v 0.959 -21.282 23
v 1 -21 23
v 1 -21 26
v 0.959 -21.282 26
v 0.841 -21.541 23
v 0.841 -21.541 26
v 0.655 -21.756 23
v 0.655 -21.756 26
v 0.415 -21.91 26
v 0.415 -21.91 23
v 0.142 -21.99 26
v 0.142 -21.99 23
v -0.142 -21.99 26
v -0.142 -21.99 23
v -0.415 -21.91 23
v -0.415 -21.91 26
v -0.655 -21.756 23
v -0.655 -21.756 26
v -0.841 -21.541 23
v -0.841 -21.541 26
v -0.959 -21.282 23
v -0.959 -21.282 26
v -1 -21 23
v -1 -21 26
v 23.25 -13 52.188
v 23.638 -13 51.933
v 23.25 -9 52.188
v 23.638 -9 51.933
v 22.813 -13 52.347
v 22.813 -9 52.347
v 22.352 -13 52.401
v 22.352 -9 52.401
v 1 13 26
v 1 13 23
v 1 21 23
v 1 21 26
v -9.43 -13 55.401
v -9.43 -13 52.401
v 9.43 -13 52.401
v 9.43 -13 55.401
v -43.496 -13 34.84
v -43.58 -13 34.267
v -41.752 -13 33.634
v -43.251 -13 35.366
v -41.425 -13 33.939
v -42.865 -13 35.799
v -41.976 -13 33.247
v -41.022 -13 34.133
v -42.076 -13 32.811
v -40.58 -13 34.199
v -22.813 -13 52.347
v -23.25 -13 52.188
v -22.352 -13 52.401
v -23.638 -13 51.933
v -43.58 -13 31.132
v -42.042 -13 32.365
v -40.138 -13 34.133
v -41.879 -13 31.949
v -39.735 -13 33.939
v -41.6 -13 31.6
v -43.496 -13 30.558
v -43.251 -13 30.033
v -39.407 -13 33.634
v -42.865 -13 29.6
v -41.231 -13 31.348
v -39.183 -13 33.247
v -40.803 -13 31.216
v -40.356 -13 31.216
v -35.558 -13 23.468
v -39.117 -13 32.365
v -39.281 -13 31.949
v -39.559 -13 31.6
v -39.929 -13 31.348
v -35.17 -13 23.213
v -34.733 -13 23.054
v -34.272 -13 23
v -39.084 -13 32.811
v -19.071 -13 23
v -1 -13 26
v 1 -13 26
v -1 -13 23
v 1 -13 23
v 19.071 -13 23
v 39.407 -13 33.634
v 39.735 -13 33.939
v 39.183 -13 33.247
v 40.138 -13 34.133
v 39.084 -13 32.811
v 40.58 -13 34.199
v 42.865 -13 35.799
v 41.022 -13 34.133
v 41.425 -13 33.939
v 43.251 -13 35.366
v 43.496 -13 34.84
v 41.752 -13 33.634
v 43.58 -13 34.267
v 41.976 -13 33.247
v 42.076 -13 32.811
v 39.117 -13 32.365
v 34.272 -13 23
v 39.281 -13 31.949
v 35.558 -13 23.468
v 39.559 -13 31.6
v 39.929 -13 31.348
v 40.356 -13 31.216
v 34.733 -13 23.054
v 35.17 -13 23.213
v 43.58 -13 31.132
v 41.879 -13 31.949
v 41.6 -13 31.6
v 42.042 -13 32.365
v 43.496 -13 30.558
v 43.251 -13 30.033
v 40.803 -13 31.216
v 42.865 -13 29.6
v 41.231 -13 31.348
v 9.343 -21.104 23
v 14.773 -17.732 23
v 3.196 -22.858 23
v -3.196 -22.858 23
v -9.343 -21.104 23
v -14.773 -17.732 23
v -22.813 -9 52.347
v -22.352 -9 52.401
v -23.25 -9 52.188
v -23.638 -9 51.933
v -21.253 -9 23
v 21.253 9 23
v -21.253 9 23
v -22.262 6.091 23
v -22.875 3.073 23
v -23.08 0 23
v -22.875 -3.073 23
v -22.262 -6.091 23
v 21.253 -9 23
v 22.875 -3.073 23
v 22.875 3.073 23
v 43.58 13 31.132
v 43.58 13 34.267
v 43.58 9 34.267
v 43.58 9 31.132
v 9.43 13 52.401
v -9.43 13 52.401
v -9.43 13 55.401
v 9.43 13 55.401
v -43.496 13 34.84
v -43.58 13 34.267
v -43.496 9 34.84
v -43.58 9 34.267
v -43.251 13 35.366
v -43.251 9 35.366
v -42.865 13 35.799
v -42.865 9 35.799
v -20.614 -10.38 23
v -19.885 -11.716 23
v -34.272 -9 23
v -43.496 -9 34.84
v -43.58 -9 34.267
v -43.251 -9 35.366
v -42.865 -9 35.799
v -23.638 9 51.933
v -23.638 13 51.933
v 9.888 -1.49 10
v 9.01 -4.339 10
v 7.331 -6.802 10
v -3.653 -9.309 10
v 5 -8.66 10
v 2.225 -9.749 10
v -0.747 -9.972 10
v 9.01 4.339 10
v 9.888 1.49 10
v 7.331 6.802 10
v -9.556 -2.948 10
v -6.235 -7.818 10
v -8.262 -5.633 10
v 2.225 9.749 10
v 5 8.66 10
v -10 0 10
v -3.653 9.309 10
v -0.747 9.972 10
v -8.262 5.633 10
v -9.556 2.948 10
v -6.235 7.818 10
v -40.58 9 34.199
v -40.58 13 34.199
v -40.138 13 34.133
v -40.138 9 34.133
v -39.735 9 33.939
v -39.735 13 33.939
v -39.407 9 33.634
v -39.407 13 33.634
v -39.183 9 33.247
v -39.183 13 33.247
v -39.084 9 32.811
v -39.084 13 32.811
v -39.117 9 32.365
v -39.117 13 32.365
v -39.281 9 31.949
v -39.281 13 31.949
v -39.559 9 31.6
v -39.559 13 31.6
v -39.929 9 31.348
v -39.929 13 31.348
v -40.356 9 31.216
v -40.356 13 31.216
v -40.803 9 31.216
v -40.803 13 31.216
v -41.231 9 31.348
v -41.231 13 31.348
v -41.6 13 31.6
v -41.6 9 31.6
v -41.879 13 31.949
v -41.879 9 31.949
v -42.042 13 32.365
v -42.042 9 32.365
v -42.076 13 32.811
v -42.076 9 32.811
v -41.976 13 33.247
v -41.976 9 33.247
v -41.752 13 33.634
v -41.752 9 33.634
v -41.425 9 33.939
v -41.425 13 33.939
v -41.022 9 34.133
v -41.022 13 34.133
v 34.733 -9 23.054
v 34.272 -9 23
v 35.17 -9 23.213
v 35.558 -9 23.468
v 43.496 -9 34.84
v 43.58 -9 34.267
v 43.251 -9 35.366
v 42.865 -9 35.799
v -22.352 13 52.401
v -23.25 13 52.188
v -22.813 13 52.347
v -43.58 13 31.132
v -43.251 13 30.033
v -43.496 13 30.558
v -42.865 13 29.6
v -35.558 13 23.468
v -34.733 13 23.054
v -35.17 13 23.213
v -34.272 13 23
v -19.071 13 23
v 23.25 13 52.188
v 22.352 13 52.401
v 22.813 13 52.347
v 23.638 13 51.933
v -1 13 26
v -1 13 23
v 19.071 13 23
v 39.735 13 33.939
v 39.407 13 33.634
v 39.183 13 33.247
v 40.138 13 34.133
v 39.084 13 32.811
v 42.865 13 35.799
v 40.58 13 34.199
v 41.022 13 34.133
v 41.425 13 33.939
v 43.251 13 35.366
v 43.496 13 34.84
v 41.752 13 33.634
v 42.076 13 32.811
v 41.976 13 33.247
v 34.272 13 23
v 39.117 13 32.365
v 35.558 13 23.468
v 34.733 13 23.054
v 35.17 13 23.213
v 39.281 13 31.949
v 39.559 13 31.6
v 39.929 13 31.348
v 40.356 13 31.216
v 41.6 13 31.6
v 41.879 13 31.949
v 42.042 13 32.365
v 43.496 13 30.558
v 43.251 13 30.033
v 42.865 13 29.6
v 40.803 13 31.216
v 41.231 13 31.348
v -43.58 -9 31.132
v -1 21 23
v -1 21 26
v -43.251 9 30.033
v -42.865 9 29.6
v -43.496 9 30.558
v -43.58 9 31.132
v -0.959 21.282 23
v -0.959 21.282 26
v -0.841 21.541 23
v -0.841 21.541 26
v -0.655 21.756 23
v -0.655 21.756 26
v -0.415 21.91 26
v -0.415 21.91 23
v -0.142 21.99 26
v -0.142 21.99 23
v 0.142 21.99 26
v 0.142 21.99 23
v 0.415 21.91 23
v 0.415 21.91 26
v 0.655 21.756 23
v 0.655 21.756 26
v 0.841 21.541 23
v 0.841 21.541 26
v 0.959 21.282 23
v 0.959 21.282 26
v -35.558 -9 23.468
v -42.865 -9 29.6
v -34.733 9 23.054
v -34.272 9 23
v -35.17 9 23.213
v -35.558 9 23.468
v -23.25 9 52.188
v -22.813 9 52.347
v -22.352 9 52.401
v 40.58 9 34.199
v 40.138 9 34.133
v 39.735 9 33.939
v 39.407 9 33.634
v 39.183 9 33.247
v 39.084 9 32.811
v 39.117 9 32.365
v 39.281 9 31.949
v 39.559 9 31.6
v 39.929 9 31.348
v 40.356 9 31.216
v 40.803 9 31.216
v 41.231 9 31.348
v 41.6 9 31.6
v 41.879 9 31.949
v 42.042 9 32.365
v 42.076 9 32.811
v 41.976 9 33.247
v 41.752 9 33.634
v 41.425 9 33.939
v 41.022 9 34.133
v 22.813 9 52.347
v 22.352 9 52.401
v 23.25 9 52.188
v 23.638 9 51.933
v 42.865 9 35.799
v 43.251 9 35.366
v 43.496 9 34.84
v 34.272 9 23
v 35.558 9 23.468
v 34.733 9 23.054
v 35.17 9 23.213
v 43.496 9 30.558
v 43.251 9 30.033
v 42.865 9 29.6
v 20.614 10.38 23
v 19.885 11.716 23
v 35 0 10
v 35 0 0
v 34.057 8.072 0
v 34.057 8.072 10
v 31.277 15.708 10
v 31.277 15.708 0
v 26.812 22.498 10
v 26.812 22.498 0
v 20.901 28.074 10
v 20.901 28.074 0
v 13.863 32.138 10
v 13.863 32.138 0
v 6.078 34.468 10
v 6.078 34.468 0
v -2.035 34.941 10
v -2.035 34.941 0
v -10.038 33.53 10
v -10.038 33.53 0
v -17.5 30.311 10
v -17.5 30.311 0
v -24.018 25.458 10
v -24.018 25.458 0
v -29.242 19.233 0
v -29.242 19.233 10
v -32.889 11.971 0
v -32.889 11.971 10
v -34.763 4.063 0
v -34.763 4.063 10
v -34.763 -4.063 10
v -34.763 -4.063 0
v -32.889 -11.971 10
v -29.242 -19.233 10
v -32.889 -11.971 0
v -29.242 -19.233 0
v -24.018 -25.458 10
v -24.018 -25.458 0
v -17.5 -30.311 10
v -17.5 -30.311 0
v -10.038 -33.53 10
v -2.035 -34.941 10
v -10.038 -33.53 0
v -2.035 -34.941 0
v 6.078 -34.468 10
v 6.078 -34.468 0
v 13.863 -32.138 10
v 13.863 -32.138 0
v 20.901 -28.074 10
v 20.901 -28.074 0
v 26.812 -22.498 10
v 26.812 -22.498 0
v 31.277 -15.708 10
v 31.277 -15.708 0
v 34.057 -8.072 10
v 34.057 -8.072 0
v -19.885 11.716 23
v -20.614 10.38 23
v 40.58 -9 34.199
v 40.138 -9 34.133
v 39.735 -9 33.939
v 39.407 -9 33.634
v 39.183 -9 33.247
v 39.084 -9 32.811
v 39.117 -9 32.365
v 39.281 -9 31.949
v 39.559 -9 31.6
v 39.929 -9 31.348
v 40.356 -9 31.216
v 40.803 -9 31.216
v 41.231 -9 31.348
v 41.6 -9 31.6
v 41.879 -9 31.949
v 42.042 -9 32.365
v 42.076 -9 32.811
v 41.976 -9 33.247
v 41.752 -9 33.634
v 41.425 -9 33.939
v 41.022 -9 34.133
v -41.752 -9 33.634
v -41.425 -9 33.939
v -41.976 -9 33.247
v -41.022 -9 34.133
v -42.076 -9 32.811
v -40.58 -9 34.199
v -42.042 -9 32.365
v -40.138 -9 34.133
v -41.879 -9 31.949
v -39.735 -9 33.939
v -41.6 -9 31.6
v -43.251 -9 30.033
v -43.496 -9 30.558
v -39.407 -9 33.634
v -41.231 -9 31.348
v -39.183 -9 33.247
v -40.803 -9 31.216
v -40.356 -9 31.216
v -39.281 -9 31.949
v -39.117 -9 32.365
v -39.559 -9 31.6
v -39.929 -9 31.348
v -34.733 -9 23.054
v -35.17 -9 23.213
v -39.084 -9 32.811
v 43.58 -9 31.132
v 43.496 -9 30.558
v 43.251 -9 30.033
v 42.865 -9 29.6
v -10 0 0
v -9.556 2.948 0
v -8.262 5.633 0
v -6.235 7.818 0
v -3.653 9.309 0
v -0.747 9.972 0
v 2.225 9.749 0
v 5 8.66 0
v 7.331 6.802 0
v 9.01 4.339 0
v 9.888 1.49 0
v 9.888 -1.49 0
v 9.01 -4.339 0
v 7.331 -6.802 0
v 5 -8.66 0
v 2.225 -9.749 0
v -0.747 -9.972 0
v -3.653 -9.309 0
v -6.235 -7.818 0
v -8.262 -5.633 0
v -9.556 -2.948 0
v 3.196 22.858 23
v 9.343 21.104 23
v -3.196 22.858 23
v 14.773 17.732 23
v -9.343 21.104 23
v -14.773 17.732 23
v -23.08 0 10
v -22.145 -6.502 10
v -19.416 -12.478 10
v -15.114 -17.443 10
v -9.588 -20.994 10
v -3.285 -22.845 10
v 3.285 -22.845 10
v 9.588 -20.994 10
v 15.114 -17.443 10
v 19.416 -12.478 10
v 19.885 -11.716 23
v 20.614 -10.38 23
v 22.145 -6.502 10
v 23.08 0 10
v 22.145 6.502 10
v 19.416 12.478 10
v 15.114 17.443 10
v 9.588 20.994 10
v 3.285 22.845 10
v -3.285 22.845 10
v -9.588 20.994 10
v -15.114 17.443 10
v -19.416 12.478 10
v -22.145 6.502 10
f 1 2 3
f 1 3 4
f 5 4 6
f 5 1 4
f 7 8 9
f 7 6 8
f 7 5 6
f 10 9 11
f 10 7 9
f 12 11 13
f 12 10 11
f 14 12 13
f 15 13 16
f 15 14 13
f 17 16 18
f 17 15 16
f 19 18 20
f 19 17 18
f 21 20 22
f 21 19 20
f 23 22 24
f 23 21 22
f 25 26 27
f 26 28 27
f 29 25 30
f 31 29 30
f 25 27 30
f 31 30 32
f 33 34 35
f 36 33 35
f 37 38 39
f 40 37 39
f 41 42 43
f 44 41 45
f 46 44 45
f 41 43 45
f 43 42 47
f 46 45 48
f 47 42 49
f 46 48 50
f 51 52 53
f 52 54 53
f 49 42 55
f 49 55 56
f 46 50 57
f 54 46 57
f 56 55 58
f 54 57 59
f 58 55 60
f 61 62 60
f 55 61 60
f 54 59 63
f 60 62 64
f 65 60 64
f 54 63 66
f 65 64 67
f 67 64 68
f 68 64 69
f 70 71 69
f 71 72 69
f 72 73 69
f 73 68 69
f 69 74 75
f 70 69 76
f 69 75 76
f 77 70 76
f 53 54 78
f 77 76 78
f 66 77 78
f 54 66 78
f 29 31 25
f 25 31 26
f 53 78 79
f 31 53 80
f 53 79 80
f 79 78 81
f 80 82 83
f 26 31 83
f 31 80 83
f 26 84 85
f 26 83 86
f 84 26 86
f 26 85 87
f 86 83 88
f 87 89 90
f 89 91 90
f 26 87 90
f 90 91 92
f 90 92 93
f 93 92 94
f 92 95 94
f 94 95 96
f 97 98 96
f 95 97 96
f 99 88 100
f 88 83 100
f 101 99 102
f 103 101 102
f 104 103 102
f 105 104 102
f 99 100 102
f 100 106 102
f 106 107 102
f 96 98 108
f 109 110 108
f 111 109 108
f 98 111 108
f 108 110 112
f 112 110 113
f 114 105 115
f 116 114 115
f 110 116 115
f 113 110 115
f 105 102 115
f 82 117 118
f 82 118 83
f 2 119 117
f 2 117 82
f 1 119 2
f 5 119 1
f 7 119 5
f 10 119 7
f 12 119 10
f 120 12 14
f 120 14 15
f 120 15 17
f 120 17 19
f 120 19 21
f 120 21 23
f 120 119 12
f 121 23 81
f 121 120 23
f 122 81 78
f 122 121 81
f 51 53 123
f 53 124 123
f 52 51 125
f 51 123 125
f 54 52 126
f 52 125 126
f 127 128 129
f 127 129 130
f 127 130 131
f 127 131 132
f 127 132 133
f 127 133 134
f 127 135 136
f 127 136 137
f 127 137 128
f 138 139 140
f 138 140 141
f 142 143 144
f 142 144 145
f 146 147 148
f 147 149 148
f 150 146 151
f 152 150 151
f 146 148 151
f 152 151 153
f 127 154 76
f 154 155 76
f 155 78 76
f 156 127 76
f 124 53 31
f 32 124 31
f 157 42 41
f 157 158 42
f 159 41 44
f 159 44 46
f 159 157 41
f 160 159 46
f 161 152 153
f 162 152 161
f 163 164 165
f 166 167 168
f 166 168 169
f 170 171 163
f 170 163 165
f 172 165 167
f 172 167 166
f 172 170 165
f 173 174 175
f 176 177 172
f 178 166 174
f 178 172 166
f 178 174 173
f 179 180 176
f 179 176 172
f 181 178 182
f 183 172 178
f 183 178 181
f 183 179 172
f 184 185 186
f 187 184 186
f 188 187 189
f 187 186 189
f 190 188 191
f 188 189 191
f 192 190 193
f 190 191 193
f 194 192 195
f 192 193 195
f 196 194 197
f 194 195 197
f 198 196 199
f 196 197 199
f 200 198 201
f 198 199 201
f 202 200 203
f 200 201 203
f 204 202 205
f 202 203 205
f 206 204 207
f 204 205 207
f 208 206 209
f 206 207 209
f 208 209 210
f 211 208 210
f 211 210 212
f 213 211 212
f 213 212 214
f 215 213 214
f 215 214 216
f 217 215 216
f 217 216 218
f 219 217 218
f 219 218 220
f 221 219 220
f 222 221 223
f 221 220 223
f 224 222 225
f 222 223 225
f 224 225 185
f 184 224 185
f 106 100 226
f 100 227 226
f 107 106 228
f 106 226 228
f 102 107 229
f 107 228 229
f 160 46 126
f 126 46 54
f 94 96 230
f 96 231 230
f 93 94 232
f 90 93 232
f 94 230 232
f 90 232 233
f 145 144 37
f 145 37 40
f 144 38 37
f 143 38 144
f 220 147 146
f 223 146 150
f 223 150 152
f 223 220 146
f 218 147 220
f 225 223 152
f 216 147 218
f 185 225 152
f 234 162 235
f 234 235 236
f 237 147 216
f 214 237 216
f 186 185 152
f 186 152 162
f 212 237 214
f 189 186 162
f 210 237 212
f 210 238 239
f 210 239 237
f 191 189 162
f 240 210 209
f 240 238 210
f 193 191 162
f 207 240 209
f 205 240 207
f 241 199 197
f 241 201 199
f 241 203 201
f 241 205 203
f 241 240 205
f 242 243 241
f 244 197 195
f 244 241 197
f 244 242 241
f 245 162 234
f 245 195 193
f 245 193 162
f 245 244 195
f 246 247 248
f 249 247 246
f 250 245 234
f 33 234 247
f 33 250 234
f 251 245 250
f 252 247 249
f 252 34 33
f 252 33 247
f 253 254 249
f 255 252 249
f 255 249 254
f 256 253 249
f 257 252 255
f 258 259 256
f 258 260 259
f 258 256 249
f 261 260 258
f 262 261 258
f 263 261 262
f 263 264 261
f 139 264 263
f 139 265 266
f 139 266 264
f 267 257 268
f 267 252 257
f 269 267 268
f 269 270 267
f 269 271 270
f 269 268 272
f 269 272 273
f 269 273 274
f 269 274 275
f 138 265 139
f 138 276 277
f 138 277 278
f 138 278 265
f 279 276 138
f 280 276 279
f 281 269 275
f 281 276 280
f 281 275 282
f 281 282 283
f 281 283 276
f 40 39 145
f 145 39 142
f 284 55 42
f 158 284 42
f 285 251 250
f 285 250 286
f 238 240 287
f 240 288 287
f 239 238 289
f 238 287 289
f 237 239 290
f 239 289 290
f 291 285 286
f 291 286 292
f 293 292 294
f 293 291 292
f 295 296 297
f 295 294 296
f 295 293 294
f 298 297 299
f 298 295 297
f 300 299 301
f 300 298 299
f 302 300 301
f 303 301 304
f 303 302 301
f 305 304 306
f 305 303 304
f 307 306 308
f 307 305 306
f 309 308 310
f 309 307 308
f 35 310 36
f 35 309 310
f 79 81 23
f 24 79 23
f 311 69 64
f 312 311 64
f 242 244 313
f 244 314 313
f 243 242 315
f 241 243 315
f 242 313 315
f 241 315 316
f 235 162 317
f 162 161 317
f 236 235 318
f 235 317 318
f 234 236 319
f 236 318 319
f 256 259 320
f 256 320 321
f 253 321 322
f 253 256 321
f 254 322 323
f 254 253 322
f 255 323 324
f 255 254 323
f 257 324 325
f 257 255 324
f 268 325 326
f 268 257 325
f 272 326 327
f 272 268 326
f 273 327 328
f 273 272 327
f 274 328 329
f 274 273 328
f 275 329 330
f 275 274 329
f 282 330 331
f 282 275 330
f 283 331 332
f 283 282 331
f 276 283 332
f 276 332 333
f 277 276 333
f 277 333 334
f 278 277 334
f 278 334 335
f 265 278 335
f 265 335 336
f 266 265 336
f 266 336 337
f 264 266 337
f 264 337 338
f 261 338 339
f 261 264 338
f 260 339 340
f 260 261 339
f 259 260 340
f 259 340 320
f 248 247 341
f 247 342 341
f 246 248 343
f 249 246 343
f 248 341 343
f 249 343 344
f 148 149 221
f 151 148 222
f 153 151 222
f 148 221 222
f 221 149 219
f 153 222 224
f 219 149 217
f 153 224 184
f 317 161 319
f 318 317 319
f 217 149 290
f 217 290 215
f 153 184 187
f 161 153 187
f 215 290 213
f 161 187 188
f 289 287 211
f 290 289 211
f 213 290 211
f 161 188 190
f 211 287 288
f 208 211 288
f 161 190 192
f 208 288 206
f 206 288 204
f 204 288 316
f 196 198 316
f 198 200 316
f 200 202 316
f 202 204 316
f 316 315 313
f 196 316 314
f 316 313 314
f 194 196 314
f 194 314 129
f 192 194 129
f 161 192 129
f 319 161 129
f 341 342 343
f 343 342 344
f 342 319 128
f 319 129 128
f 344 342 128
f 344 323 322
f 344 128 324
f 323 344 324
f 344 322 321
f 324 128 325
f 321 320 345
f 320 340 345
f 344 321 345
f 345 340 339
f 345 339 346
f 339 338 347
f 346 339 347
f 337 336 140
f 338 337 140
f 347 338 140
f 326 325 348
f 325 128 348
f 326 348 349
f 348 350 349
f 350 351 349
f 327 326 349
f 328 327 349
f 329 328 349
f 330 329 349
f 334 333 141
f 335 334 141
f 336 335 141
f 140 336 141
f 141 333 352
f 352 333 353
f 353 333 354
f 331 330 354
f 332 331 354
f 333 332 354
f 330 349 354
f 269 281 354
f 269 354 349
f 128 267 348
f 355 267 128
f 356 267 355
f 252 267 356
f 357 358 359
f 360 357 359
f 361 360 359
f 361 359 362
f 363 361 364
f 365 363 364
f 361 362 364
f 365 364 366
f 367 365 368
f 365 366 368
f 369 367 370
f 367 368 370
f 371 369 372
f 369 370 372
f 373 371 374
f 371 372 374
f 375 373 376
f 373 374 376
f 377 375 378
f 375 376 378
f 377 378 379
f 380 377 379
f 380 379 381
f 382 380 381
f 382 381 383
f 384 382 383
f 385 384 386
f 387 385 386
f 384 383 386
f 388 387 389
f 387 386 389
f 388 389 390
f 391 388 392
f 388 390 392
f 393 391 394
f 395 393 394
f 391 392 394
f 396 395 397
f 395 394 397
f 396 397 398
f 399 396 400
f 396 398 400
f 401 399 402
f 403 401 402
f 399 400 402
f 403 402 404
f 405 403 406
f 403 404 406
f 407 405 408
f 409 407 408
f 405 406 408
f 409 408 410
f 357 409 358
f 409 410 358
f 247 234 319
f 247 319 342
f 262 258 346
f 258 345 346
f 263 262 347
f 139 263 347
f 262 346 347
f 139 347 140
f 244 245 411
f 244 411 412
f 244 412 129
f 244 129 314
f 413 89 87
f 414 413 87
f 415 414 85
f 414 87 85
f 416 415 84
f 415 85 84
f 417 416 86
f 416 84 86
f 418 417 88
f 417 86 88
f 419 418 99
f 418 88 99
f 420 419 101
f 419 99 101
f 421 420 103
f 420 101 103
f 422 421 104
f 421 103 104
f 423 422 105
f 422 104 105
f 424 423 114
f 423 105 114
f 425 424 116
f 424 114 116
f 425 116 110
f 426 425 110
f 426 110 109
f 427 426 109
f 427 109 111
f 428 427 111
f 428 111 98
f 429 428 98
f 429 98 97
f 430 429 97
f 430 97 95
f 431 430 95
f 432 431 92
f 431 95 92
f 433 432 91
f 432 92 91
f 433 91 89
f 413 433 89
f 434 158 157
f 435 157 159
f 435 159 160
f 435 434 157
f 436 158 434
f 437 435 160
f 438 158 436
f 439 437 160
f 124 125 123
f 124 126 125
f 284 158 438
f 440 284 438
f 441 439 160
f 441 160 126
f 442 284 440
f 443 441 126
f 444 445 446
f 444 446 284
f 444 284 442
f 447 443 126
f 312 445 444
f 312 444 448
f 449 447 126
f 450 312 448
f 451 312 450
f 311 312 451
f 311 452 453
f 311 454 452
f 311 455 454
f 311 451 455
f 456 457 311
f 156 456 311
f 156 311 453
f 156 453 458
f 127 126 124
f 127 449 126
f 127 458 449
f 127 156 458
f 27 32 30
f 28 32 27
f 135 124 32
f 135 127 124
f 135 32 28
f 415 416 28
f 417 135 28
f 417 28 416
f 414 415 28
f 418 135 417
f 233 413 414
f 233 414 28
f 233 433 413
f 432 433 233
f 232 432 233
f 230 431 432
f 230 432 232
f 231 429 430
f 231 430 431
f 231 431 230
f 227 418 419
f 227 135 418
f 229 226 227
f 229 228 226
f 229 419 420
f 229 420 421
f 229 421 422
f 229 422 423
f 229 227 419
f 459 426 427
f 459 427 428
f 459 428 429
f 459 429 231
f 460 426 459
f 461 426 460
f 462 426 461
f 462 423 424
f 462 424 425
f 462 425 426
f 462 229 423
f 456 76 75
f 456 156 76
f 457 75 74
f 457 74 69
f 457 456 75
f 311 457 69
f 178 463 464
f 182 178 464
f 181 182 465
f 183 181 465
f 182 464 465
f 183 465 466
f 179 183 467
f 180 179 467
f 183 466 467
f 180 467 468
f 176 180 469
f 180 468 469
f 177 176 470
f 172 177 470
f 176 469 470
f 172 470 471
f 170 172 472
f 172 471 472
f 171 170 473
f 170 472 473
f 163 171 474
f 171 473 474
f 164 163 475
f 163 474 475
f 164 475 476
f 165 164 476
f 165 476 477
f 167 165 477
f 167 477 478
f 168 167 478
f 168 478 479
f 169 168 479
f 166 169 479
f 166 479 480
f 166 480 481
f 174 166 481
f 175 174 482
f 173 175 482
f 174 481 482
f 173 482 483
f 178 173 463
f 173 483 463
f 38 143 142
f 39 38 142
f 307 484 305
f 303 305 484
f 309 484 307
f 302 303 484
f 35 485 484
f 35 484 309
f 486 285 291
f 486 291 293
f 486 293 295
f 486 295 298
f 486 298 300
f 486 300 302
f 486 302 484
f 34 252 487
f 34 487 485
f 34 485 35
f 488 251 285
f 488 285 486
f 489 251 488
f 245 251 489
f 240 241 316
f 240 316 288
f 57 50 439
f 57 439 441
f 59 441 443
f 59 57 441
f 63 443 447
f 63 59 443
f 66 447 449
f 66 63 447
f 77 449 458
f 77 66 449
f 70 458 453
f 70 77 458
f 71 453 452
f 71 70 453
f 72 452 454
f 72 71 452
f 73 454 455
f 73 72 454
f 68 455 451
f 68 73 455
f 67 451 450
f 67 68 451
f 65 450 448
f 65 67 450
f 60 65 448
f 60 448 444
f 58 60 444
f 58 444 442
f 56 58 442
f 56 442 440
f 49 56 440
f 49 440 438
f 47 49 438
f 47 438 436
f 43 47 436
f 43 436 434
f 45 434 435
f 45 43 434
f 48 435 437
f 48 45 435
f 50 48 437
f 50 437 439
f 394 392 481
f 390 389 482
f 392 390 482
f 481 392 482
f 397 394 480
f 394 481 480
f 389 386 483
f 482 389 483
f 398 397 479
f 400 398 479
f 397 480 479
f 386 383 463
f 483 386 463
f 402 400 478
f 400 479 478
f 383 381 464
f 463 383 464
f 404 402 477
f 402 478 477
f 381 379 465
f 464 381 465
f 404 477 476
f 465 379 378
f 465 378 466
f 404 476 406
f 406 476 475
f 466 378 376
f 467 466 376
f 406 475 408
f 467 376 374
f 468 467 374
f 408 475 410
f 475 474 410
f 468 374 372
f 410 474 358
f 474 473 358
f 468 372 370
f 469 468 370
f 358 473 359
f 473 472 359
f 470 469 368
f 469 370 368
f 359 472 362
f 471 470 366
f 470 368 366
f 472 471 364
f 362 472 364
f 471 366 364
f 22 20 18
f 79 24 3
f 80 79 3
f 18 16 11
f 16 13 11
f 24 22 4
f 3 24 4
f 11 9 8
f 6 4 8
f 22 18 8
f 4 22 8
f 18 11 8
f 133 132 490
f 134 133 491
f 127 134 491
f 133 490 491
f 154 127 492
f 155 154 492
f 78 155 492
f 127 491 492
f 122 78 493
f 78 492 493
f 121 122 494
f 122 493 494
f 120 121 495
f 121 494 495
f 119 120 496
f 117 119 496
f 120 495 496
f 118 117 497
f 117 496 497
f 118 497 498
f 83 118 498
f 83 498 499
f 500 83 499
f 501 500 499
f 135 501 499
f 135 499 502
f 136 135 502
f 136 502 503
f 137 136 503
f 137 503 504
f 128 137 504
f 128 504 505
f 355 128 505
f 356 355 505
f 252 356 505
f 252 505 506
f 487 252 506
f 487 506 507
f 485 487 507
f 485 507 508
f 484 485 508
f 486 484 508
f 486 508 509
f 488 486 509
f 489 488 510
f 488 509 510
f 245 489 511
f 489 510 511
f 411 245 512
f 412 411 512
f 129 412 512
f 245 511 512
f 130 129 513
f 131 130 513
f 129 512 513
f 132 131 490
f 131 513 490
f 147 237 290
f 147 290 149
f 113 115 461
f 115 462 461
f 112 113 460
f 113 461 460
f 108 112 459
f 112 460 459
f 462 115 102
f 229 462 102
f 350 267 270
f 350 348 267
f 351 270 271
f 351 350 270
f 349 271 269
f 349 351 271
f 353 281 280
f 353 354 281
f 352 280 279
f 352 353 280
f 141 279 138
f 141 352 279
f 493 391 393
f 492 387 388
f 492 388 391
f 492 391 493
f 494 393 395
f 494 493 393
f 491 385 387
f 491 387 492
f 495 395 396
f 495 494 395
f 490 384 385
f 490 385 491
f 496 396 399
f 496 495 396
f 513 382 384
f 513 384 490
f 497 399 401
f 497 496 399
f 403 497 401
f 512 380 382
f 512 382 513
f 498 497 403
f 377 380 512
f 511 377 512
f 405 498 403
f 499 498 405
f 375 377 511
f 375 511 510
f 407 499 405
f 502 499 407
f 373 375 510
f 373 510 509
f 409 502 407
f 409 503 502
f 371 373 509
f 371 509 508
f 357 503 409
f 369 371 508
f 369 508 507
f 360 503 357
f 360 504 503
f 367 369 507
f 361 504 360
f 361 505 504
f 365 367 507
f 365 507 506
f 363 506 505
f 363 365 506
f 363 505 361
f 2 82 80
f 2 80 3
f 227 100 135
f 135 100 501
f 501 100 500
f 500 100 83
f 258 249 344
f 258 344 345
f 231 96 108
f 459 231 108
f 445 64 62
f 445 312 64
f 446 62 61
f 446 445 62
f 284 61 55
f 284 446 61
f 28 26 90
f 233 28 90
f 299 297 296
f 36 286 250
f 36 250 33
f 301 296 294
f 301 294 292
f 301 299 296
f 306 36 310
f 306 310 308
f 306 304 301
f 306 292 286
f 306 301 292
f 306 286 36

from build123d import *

# Parameters (mm, degrees)
SKETCH1_R                   = 35
BOSS_EXTRUDE1_DEPTH         = 10
SKETCH2_R                   = 23.08
BOSS_EXTRUDE2_DEPTH         = 13
BOSS_EXTRUDE3_DEPTH         = 4
FILLET1_R                   = 2
SKETCH5_R                   = 1.5
CUT_EXTRUDE1_DEPTH          = 4
MIRROR2_COPY_1_SKETCH_R     = 1.5
MIRROR2_COPY_1_DEPTH        = 4
FILLET1_OF_MIRROR2_R        = 2
SKETCH6_W                   = 2
SKETCH6_H                   = 9
BOSS_EXTRUDE4_DEPTH         = 3
FILLET2_RADIUS              = 1
FILLET2_LENGTH              = 3
FILLET2_OF_MIRROR3_2_RADIUS = 1
FILLET2_OF_MIRROR3_2_LENGTH = 3
SKETCH7_W                   = 18.86
SKETCH7_H                   = 26
BOSS_EXTRUDE5_DEPTH         = 3
SKETCH8_R                   = 10
CUT_EXTRUDE2_DEPTH          = 10


with BuildPart() as part:
    # Sketch1 → Boss-Extrude1 (new body)
    with BuildSketch(Plane.XY):
        Circle(SKETCH1_R)
    extrude(amount=BOSS_EXTRUDE1_DEPTH)

    # Sketch2 → Boss-Extrude2 (add)
    with BuildSketch(Plane.XY.offset(10)):
        with Locations(Location((0, 0, 0), (0, 0, 180))):
            Circle(SKETCH2_R)
    extrude(amount=BOSS_EXTRUDE2_DEPTH)

    # Sketch4 → Boss-Extrude3 (add)
    with BuildSketch(Plane(origin=(0, 13, 0), x_dir=(1, 0, 0), z_dir=(0, 1, 0))):
        Polygon((35, -23), (-35, -23), (-43.579697763, -30.199221228), (-43.579697763, -35.199221228), (-23.08, -52.400510061), (23.08, -52.400510061), (43.579697763, -35.199221228), (43.579697763, -30.199221228), align=None)
    boss_extrude3 = extrude(amount=-BOSS_EXTRUDE3_DEPTH)

    # Fillet1
    fillet1_edges = [part.edges().sort_by_distance(p)[0] for p in [
        (-43.579697763, 11, 30.199221228),
        (-35, 11, 23),
        (35, 11, 23),
        (43.579697763, 11, 30.199221228),
        (43.579697763, 11, 35.199221228),
        (23.08, 11, 52.400510061),
        (-23.08, 11, 52.400510061),
        (-43.579697763, 11, 35.199221228),
    ]]
    fillet(fillet1_edges, radius=FILLET1_R)

    # Sketch5 → Cut-Extrude1 (cut)
    with BuildSketch(Plane(origin=(0, 13, 0), x_dir=(1, 0, 0), z_dir=(0, 1, 0))):
        with Locations(Location((-40.579697763, -32.699221228, 0), (0, 0, 270))):
            Circle(SKETCH5_R)
    cut_extrude1 = extrude(amount=-CUT_EXTRUDE1_DEPTH, mode=Mode.SUBTRACT)

    # Mirror1: Cut-Extrude1 across plane
    add(cut_extrude1.mirror(Plane(origin=(0, 0, 0), x_dir=(0, 0, 1), z_dir=(1, 0, 0))), mode=Mode.SUBTRACT)

    # Mirror2: Boss-Extrude3, Cut-Extrude1 across plane
    add(boss_extrude3.mirror(Plane.ZX))
    add(cut_extrude1.mirror(Plane.ZX), mode=Mode.SUBTRACT)

    # Mirror2 copy 1 sketch → Mirror2 copy 1 (cut)
    with BuildSketch(Plane(origin=(0, -13, 0), x_dir=(-1, 0, 0), z_dir=(0, -1, 0))):
        with Locations(Location((-40.579697763, -32.699221228, 0), (0, 0, 270))):
            Circle(MIRROR2_COPY_1_SKETCH_R)
    extrude(amount=-MIRROR2_COPY_1_DEPTH, mode=Mode.SUBTRACT)

    # Fillet1 of Mirror2
    fillet1_of_mirror2_edges = [part.edges().sort_by_distance(p)[0] for p in [
        (-43.579697763, -11, 30.199221228),
        (-35, -11, 23),
        (35, -11, 23),
        (43.579697763, -11, 30.199221228),
        (43.579697763, -11, 35.199221228),
        (23.08, -11, 52.400510061),
        (-23.08, -11, 52.400510061),
        (-43.579697763, -11, 35.199221228),
    ]]
    fillet(fillet1_of_mirror2_edges, radius=FILLET1_OF_MIRROR2_R)

    # Sketch6 → Boss-Extrude4 (add)
    with BuildSketch(Plane.XY.offset(23)):
        with Locations((0, 17.5)):
            Rectangle(SKETCH6_W, SKETCH6_H)
    boss_extrude4 = extrude(amount=BOSS_EXTRUDE4_DEPTH)

    # Fillet2: full round fillet: the end face becomes a half cylinder, R = half its width
    fillet2_face = Plane((0, 22, 24.5), x_dir=(0, 0, -1), z_dir=(0, 1, 0))  # on the end face: x along it, z out of the body
    fillet2_slab = fillet2_face.offset(-FILLET2_RADIUS / 2) * Box(FILLET2_LENGTH, 2 * FILLET2_RADIUS, FILLET2_RADIUS, mode=Mode.PRIVATE)  # the body's end, R deep
    fillet2_round = Plane((0, 21, 24.5), x_dir=(0, 1, 0), z_dir=(0, 0, -1)) * Cylinder(FILLET2_RADIUS, FILLET2_LENGTH, mode=Mode.PRIVATE)  # its axis R under the face
    add(fillet2_slab - fillet2_round, mode=Mode.SUBTRACT)

    # Mirror3: Boss-Extrude4 across plane
    add(boss_extrude4.mirror(Plane.ZX))

    # Fillet2 of Mirror3 2: full round fillet: the end face becomes a half cylinder, R = half its width
    fillet2_of_mirror3_2_face = Plane((0, -22, 24.5), x_dir=(0, 0, -1), z_dir=(0, -1, 0))  # on the end face: x along it, z out of the body
    fillet2_of_mirror3_2_slab = fillet2_of_mirror3_2_face.offset(-FILLET2_OF_MIRROR3_2_RADIUS / 2) * Box(FILLET2_OF_MIRROR3_2_LENGTH, 2 * FILLET2_OF_MIRROR3_2_RADIUS, FILLET2_OF_MIRROR3_2_RADIUS, mode=Mode.PRIVATE)  # the body's end, R deep
    fillet2_of_mirror3_2_round = Plane((0, -21, 24.5), x_dir=(0, -1, 0), z_dir=(0, 0, -1)) * Cylinder(FILLET2_OF_MIRROR3_2_RADIUS, FILLET2_OF_MIRROR3_2_LENGTH, mode=Mode.PRIVATE)  # its axis R under the face
    add(fillet2_of_mirror3_2_slab - fillet2_of_mirror3_2_round, mode=Mode.SUBTRACT)

    # Sketch8 → Cut-Extrude2 (cut)
    with BuildSketch(Plane(origin=(0, 0, 0), x_dir=(-1, 0, 0), z_dir=(0, 0, -1))):
        Circle(SKETCH8_R)
    extrude(amount=-CUT_EXTRUDE2_DEPTH, mode=Mode.SUBTRACT)


with BuildPart() as body_2:
    # Sketch7 → Boss-Extrude5 (new body)
    with BuildSketch(Plane.XY.offset(52.400510061)):
        Rectangle(SKETCH7_W, SKETCH7_H)
    extrude(amount=BOSS_EXTRUDE5_DEPTH)


solid = Compound([part.part, body_2.part])
